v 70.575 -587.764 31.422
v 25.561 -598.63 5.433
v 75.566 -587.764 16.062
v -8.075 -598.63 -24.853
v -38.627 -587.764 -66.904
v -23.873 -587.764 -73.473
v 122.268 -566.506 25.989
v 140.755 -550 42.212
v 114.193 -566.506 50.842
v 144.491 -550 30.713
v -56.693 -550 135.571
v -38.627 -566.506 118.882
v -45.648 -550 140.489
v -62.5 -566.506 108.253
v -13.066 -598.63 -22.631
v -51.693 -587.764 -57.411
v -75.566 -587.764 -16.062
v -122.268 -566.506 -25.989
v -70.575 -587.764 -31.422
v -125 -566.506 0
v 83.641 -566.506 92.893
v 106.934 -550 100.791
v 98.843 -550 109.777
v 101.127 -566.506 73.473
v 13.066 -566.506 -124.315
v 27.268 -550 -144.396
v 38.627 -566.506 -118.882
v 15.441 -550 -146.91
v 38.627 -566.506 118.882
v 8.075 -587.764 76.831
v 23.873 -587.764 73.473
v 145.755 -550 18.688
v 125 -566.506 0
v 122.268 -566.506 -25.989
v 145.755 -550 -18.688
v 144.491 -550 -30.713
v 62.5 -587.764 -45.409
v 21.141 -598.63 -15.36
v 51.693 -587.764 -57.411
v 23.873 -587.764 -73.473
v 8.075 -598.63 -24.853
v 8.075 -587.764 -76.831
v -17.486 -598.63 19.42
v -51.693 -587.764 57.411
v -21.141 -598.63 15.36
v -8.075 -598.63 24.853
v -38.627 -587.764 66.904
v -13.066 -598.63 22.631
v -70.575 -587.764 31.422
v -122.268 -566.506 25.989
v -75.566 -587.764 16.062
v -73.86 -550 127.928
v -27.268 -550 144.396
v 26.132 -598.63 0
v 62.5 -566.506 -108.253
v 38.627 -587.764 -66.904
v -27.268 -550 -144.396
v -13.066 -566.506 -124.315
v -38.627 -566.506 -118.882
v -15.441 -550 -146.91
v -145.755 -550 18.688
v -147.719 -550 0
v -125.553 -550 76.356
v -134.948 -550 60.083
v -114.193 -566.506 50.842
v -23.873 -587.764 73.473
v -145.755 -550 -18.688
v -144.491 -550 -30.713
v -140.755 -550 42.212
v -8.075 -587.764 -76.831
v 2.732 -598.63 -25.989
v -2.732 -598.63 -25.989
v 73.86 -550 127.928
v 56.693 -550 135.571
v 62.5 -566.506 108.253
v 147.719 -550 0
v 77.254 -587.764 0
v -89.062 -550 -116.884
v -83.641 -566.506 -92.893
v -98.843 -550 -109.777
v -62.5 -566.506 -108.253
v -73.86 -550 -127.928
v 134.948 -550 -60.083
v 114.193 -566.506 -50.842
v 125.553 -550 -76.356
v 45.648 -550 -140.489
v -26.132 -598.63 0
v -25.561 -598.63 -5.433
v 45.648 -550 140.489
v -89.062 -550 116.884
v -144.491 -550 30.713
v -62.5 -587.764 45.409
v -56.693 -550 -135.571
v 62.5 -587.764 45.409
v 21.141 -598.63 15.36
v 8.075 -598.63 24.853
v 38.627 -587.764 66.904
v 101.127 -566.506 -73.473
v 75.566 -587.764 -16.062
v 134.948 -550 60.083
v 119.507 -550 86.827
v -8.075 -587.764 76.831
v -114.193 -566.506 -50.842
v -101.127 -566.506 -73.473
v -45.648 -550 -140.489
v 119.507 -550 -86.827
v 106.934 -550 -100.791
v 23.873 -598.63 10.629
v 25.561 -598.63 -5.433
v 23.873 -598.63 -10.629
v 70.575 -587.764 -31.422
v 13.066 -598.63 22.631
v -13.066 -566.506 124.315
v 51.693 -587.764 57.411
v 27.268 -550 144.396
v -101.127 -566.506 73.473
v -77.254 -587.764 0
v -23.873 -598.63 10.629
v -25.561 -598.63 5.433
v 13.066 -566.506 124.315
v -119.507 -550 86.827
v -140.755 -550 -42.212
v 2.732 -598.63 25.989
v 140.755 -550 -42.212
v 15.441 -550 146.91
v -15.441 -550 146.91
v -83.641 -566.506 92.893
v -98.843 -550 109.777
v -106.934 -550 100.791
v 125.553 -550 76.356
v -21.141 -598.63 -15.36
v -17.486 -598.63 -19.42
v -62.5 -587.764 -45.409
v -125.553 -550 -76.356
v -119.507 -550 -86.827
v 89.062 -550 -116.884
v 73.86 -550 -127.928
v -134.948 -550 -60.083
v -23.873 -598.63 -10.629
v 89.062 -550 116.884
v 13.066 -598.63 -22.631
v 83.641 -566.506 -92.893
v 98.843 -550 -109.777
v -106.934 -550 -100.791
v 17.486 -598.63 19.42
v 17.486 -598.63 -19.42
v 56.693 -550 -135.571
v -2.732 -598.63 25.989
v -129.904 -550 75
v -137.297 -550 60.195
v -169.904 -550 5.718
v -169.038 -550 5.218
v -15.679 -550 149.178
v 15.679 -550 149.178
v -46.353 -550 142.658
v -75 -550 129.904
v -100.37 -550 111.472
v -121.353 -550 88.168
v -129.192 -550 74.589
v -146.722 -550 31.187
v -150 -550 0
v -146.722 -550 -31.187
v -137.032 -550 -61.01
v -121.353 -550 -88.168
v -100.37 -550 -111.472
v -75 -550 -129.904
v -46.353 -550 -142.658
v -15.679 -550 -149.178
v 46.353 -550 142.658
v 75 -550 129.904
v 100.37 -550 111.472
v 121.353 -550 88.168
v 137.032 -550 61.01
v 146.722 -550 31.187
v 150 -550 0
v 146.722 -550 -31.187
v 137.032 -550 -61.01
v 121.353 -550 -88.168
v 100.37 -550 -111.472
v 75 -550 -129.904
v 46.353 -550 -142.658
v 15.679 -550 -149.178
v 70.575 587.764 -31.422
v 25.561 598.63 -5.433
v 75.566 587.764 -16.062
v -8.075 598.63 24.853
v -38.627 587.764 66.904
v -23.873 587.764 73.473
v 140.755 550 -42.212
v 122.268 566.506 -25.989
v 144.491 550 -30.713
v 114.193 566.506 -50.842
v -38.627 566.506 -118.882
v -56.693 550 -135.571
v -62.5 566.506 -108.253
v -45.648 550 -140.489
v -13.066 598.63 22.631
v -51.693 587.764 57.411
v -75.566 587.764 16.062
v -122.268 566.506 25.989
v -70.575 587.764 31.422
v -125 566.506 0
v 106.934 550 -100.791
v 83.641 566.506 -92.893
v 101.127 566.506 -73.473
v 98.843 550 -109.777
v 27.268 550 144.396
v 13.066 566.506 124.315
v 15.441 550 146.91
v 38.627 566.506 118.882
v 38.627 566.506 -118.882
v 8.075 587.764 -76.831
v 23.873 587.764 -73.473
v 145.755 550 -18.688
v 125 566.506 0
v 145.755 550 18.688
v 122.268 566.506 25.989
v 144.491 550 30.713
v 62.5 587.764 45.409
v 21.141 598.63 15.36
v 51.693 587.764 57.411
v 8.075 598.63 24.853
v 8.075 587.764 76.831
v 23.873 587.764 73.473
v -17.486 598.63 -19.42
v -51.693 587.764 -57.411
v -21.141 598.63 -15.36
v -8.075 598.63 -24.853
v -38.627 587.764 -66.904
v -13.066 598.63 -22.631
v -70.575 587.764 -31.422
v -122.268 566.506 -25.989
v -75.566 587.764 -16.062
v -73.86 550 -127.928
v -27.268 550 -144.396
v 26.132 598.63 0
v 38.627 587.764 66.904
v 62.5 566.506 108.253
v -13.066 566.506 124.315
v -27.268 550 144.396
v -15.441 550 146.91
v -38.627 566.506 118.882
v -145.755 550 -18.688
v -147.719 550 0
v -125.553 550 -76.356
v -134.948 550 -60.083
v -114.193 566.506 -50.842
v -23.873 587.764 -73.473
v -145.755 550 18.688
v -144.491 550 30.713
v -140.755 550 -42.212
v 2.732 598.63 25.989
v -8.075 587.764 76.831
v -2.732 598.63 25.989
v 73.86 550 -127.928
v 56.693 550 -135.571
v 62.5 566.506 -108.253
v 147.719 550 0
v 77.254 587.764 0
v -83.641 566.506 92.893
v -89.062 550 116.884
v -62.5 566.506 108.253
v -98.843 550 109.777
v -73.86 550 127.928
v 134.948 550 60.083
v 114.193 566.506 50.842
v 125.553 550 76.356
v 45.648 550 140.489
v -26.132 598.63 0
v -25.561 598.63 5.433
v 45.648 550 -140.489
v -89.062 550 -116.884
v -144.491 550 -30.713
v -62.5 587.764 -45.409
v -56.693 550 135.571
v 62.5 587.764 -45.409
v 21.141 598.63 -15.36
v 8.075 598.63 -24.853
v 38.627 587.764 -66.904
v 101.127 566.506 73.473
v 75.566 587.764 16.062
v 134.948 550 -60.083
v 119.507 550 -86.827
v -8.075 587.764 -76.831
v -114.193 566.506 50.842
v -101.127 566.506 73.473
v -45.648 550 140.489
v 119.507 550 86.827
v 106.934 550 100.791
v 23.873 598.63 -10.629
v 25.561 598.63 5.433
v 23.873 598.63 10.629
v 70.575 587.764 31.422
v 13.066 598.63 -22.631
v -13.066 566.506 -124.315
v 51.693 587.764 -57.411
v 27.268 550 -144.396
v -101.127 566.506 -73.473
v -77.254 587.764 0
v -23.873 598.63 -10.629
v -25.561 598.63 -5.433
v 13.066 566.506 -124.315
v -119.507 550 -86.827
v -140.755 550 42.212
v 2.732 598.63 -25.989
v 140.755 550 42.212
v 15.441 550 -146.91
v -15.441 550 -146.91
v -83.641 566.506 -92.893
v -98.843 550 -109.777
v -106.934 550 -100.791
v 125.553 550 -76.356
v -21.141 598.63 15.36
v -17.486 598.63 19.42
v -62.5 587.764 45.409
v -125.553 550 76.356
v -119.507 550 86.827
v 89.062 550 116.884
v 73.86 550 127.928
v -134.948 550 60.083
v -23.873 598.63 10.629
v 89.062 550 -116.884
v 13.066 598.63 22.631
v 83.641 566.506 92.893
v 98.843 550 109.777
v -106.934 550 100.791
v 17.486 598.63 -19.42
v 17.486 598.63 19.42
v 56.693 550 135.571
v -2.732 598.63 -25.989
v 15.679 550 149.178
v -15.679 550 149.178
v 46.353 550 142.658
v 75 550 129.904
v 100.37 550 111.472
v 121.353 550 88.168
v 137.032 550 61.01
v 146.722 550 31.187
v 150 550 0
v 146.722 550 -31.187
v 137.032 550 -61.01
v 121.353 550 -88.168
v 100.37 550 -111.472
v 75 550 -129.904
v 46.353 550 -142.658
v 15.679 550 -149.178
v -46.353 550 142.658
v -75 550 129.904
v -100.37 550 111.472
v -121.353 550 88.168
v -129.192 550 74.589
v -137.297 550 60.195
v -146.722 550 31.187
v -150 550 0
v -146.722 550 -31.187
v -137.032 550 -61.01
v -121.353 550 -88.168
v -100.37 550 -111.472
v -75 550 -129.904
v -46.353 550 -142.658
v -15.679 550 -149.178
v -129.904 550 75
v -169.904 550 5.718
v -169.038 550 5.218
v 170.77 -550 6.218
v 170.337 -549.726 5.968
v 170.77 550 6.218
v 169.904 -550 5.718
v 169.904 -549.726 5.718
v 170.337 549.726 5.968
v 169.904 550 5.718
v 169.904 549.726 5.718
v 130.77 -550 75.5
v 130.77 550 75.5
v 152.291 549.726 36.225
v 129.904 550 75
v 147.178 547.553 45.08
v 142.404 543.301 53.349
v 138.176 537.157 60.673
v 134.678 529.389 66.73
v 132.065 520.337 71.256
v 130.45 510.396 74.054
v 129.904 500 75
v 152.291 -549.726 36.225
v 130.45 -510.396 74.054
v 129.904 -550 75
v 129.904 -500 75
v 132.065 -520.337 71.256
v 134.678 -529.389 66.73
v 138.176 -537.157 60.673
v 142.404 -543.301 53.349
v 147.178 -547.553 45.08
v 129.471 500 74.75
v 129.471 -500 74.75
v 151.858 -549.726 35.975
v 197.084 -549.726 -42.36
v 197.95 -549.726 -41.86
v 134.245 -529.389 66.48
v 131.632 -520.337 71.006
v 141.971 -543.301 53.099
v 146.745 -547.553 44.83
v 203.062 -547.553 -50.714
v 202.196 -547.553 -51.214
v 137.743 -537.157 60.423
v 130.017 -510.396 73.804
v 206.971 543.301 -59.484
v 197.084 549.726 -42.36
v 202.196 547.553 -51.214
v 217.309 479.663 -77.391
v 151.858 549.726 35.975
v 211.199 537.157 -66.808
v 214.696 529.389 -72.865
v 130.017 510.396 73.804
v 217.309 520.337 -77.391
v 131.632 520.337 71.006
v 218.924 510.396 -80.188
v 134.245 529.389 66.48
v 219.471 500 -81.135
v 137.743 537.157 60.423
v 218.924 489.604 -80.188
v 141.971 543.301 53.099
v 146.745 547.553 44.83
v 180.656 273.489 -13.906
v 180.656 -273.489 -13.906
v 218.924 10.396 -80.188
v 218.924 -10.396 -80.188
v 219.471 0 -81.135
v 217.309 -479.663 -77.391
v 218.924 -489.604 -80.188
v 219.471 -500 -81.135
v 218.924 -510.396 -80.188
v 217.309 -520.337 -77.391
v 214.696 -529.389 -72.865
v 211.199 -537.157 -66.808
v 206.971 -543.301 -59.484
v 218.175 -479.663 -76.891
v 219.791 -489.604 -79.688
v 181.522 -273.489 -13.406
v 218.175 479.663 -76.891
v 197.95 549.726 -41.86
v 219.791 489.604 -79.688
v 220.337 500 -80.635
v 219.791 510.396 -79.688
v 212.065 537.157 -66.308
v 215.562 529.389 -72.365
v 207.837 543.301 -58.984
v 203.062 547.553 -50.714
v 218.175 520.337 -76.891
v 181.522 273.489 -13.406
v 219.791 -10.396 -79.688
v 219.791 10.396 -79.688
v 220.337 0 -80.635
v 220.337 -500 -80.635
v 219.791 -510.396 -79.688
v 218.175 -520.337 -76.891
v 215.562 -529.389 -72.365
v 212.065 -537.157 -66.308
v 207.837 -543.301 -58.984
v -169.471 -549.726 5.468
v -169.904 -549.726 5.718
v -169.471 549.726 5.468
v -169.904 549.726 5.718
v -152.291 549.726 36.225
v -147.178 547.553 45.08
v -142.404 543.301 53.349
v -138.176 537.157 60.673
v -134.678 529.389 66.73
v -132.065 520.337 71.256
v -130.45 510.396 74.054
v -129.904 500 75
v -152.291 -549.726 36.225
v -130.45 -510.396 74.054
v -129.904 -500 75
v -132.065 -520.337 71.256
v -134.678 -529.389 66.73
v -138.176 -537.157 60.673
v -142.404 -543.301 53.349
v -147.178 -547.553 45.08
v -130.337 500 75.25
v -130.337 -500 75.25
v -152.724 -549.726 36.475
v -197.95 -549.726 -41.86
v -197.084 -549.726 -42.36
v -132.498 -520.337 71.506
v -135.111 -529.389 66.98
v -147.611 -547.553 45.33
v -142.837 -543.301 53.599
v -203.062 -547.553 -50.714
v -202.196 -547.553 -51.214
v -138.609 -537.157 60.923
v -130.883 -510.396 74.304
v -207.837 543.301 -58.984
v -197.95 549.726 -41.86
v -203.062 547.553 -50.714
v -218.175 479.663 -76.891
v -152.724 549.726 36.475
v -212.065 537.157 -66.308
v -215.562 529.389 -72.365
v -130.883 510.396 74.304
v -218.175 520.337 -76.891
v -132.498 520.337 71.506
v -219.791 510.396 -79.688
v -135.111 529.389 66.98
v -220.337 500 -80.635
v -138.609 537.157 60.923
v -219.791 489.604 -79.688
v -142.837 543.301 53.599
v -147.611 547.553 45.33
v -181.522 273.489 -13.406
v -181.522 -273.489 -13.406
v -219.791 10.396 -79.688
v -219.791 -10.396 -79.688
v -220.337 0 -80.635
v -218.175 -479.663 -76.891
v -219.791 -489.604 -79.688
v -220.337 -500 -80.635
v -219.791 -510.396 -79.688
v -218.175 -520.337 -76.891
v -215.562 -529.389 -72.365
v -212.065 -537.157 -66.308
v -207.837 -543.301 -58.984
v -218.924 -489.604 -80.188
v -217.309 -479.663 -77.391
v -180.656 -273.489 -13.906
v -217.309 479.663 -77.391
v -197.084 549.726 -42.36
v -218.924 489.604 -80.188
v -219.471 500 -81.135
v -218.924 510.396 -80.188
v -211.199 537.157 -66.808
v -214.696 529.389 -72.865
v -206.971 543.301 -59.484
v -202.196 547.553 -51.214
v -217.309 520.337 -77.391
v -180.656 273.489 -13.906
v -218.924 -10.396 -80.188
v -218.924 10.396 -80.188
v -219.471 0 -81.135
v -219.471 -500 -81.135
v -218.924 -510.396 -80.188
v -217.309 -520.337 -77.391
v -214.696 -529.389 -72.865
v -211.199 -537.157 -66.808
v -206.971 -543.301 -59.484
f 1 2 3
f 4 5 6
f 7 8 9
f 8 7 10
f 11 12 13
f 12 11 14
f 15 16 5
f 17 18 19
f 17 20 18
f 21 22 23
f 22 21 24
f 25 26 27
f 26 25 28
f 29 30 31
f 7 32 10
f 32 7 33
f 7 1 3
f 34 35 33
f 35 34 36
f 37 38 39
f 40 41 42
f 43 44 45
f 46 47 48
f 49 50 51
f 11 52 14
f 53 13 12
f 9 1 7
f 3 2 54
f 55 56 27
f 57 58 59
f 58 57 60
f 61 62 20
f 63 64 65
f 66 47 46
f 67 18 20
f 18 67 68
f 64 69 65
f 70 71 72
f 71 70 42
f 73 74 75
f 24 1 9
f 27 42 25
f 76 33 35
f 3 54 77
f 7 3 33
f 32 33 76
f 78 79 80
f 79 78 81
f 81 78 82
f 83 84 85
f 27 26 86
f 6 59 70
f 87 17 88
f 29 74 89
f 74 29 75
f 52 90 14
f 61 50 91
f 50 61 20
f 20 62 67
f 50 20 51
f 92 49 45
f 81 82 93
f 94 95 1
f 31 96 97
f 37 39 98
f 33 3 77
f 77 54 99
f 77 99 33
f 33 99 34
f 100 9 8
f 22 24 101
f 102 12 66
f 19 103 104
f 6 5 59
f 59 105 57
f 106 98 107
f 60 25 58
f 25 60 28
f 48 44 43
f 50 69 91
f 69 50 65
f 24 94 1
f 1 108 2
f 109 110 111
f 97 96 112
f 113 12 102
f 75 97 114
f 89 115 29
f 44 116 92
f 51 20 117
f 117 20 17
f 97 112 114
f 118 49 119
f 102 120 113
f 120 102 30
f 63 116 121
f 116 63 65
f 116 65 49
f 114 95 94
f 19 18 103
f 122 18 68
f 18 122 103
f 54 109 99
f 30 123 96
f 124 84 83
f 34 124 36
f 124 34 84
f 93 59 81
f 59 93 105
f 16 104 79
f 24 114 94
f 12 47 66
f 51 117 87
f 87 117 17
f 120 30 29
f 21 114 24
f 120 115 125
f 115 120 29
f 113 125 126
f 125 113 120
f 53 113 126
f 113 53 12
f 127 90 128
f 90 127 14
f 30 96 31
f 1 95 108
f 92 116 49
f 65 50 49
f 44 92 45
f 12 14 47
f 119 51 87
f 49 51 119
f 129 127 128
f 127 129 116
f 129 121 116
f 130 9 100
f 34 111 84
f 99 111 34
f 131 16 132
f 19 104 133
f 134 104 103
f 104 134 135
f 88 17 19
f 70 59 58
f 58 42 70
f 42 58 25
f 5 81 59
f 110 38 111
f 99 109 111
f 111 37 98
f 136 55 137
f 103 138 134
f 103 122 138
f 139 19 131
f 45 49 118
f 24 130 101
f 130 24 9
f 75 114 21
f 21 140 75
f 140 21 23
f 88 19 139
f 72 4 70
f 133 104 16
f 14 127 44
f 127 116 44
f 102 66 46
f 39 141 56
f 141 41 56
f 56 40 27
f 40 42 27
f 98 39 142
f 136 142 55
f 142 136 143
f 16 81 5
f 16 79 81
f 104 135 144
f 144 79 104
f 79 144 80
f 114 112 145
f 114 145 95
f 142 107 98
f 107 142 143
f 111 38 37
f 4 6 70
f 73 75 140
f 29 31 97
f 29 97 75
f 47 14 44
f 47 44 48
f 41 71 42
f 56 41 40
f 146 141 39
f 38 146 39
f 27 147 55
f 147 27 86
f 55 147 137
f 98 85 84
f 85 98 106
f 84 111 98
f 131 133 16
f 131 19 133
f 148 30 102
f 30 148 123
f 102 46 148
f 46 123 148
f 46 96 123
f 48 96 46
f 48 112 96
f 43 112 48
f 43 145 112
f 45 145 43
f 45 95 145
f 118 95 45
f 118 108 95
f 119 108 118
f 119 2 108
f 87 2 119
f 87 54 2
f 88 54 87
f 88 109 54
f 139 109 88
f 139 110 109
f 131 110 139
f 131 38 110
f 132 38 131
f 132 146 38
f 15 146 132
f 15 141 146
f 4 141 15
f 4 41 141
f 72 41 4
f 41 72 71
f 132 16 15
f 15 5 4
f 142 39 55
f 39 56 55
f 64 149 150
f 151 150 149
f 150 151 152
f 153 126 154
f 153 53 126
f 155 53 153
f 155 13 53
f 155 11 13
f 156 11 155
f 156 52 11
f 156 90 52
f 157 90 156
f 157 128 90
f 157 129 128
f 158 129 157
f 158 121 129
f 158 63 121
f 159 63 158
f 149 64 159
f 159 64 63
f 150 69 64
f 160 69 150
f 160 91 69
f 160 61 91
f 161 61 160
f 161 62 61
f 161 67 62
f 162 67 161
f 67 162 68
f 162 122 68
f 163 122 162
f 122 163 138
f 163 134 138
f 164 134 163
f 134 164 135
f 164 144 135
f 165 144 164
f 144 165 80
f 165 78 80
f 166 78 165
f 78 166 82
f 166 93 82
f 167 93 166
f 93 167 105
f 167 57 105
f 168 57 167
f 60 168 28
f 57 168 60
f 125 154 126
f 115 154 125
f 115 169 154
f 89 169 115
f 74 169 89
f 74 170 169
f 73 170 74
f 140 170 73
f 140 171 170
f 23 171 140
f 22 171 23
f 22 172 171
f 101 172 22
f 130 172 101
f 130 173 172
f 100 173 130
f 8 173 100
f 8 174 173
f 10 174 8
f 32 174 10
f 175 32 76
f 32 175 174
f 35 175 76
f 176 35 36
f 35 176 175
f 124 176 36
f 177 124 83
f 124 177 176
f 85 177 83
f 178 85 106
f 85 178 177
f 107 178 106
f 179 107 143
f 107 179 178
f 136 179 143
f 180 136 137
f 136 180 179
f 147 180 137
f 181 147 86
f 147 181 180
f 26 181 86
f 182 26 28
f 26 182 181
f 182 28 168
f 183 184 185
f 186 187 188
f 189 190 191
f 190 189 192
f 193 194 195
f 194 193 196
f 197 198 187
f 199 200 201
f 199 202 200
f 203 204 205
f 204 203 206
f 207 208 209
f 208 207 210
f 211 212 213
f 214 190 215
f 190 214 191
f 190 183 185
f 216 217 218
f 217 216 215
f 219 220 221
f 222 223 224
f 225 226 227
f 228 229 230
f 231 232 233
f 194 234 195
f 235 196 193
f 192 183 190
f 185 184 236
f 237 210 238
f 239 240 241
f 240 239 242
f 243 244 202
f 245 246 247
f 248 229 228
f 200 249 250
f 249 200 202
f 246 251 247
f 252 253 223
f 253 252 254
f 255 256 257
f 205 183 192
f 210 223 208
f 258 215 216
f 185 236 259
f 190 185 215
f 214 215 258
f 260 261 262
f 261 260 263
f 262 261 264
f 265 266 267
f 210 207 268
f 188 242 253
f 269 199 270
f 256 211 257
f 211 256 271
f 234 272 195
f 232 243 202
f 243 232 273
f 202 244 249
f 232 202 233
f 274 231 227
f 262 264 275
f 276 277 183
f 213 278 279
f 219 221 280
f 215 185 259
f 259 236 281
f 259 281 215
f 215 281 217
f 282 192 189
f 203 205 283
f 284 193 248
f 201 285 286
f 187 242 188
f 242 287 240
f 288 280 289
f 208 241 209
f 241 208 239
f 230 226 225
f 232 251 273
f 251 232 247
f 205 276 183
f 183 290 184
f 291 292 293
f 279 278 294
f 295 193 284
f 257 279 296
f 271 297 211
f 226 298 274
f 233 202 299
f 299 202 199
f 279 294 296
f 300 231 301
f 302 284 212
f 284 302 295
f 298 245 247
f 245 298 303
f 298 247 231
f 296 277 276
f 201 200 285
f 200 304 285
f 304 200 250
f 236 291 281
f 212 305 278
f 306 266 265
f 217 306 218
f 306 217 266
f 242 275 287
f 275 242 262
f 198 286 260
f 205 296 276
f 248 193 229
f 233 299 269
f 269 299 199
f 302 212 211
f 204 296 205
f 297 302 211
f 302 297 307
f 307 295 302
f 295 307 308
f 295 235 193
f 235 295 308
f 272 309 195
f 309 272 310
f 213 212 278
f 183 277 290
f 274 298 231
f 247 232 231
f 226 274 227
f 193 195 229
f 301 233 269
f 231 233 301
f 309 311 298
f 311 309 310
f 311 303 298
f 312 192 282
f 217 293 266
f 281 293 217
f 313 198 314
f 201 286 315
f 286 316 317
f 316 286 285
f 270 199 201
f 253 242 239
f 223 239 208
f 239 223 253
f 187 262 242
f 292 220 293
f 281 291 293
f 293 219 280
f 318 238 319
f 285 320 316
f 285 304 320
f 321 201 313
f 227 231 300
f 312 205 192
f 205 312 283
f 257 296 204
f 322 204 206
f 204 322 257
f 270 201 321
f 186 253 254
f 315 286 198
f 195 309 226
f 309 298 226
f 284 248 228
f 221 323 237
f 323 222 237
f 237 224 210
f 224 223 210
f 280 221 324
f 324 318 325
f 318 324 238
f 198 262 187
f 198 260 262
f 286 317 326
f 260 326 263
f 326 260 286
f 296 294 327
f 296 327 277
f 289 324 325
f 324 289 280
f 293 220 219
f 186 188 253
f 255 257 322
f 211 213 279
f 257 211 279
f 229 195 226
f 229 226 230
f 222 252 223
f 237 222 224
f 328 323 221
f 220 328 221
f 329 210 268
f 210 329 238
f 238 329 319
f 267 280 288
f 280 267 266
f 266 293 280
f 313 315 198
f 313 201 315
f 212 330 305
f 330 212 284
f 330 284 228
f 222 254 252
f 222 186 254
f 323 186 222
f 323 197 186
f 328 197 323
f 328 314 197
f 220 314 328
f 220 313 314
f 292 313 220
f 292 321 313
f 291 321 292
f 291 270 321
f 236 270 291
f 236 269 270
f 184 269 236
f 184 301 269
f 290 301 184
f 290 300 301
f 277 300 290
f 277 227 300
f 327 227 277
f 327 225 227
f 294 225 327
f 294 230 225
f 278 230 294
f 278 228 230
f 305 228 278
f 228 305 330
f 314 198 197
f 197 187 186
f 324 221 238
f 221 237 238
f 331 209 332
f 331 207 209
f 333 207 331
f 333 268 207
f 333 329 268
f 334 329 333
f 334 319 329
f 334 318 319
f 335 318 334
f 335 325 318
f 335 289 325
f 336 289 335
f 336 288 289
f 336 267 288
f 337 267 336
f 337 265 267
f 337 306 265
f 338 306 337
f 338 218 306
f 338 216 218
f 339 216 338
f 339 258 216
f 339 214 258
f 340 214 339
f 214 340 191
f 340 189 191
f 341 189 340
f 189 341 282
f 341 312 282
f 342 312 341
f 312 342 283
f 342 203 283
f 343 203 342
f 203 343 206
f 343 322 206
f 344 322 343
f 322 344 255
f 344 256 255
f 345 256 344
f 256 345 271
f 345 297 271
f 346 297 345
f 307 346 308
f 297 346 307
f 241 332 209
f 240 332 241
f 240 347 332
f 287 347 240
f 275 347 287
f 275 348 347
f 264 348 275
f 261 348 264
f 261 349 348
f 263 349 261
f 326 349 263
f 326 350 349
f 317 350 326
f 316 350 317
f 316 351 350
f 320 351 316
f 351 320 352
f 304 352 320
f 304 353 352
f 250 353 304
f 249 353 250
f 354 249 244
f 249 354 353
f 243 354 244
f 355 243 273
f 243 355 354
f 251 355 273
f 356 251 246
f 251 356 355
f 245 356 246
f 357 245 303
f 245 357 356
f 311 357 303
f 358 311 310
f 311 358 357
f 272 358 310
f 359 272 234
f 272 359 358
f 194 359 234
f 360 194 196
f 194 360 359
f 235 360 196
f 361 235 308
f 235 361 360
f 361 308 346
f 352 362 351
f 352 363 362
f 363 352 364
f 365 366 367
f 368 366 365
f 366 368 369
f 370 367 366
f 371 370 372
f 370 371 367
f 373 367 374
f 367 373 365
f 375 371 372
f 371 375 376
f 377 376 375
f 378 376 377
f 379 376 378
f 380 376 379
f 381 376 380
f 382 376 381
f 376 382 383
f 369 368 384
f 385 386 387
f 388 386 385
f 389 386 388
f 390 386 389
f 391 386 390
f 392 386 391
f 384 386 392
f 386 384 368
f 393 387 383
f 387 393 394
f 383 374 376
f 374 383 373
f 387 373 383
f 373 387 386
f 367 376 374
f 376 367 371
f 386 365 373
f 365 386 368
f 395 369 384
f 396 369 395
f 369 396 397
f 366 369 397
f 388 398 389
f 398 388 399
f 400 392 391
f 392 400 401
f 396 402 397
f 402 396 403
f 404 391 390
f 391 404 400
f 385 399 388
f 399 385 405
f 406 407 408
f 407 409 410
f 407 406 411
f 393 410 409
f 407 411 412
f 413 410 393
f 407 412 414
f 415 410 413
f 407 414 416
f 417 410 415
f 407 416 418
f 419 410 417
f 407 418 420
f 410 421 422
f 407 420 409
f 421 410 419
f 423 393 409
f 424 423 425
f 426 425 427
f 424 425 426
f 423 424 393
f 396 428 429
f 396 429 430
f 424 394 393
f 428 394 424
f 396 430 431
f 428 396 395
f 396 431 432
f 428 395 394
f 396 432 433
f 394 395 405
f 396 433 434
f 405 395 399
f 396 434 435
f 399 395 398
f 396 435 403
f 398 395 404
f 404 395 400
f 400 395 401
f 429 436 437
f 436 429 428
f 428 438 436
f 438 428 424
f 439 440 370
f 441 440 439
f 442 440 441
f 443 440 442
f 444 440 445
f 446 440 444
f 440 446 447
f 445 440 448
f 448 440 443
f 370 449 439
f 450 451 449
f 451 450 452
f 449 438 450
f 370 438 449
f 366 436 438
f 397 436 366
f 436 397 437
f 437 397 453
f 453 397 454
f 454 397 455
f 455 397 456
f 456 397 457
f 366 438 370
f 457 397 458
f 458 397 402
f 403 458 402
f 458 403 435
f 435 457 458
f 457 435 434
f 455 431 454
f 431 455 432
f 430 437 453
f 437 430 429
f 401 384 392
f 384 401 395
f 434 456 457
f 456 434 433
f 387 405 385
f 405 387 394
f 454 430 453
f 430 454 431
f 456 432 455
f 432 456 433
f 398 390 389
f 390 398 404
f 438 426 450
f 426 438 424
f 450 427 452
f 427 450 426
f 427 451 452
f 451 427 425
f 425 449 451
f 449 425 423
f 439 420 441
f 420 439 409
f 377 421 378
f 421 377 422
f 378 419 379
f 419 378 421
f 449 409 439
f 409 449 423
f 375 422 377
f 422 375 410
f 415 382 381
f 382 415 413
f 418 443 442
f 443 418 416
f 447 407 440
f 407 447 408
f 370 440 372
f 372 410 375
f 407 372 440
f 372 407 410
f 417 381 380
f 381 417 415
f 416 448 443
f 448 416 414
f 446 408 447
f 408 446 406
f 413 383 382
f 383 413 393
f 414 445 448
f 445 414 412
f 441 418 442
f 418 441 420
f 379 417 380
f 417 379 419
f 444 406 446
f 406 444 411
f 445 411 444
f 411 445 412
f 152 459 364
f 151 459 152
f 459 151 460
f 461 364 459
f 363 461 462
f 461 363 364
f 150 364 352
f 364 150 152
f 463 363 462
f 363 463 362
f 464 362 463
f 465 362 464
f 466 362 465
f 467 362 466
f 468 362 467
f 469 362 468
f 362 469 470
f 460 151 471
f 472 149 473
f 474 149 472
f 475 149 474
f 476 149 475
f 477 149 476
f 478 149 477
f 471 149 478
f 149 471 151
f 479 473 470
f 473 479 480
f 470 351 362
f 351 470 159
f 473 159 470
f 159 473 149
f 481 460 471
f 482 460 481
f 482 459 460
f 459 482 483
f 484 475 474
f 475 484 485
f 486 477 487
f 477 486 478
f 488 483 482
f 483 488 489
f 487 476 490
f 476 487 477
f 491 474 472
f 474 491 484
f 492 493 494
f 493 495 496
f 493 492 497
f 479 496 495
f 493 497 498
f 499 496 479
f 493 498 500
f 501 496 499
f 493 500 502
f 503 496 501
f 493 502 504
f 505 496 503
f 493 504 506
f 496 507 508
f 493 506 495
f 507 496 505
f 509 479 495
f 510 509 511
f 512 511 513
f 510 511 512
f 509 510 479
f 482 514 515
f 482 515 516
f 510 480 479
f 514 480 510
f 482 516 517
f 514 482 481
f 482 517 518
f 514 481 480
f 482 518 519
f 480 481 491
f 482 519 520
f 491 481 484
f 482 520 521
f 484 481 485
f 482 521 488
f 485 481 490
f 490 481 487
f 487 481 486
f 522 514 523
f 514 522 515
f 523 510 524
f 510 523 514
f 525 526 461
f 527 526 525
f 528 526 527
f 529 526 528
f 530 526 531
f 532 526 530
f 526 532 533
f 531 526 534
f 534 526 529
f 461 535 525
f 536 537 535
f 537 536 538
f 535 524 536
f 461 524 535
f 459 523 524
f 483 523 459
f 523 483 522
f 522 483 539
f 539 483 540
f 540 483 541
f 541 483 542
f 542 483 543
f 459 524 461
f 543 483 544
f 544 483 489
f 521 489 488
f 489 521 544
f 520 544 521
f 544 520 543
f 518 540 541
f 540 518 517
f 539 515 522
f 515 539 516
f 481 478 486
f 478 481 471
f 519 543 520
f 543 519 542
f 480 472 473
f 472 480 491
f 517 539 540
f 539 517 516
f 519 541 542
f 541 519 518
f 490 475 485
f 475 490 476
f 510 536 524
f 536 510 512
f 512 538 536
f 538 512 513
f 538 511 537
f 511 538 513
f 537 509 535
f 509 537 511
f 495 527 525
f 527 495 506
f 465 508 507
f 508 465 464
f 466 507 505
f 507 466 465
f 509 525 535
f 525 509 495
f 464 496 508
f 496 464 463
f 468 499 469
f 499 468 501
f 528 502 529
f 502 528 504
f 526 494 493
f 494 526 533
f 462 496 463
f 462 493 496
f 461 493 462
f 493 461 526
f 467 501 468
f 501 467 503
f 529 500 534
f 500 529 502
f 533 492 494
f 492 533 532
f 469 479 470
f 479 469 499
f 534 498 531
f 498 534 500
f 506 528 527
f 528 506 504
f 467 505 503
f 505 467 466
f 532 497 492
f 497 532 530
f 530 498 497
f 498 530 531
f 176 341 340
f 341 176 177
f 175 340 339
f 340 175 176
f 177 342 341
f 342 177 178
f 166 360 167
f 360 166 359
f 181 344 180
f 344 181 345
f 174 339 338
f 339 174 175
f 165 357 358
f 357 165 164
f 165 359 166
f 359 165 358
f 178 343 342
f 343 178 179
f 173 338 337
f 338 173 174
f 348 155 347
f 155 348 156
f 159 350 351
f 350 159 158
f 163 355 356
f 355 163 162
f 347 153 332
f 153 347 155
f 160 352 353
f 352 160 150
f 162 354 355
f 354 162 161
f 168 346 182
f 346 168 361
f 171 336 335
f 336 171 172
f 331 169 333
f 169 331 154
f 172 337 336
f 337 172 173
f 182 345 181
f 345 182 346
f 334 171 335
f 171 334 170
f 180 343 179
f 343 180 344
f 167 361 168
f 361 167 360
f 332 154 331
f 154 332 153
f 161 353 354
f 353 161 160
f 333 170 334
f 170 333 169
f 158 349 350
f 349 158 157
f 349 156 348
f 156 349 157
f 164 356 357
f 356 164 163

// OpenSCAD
// file: side.scad
sphereDia = 500;
torchit = 50;

module Side() {

    difference(){

        translate([0,0,-(sphereDia/2 - torchit)])
        sphere(d = sphereDia);

        translate([0,0,-500])
        cylinder(h=1000, r=1000, center=true);
    }
}

Side();
// main file
use <side.scad>;


diam=300;
lenMain=1100;    // вместе с удлинителями

module Katok() {

    rotate([-90,0,0]) 
    cylinder(h=lenMain, r=diam/2, center=true);

    translate([0,-(lenMain/2),0])
    rotate([90,0,0]) 
    Side();
    
    translate([0,(lenMain/2),0])
    rotate([-90,0,0]) 
    Side();
    
//    rotate([0,0,0]) 
//    translate([0,-lenMain/2, diam/2])
    //Bort(); 


    rotate([0,60,0]) 
    translate([0,-lenMain/2, diam/2])
    Bort(); 
    
    rotate([0,-60,0]) 
    translate([0,-lenMain/2, diam/2])
    rotate([0,180,0]) 
    Bort(); 

}

liamkaWidth=160; // 1/6 длины окружности катка: треть сверху, от оставшихся третей половину оставить.
cornerCutRad=50;
module Bort() {
      cube([liamkaWidth/2, lenMain, 1]);

      //first
      hull() {

        translate([cornerCutRad, cornerCutRad, 0])
        cylinder(h=1, r=50, center=true);
        //+ 
        translate([liamkaWidth/2+cornerCutRad, cornerCutRad, 0])
        cylinder(h=1, r=50, center=true);

        //1/4
        translate([cornerCutRad, lenMain/4, 0])
        cylinder(h=1, r=50, center=true);

      }

      //middle
      hull() {
      
        //1/4
        translate([cornerCutRad, lenMain/4, 0])
        cylinder(h=1, r=50, center=true);

        //middle
        translate([liamkaWidth/2+cornerCutRad, lenMain/2, 0])
        cylinder(h=1, r=50, center=true);
      
        //3/4
        translate([cornerCutRad, lenMain*3/4, 0])
        cylinder(h=1, r=50, center=true);
      }

      //last
      hull() {
        
        //3/4
        translate([cornerCutRad, lenMain*3/4, 0])
        cylinder(h=1, r=50, center=true);

        translate([cornerCutRad, lenMain-cornerCutRad, 0])
        cylinder(h=1, r=50, center=true);
        //+
        translate([liamkaWidth/2+cornerCutRad, lenMain-cornerCutRad, 0])
        cylinder(h=1, r=50, center=true);
      }
}

Katok();
